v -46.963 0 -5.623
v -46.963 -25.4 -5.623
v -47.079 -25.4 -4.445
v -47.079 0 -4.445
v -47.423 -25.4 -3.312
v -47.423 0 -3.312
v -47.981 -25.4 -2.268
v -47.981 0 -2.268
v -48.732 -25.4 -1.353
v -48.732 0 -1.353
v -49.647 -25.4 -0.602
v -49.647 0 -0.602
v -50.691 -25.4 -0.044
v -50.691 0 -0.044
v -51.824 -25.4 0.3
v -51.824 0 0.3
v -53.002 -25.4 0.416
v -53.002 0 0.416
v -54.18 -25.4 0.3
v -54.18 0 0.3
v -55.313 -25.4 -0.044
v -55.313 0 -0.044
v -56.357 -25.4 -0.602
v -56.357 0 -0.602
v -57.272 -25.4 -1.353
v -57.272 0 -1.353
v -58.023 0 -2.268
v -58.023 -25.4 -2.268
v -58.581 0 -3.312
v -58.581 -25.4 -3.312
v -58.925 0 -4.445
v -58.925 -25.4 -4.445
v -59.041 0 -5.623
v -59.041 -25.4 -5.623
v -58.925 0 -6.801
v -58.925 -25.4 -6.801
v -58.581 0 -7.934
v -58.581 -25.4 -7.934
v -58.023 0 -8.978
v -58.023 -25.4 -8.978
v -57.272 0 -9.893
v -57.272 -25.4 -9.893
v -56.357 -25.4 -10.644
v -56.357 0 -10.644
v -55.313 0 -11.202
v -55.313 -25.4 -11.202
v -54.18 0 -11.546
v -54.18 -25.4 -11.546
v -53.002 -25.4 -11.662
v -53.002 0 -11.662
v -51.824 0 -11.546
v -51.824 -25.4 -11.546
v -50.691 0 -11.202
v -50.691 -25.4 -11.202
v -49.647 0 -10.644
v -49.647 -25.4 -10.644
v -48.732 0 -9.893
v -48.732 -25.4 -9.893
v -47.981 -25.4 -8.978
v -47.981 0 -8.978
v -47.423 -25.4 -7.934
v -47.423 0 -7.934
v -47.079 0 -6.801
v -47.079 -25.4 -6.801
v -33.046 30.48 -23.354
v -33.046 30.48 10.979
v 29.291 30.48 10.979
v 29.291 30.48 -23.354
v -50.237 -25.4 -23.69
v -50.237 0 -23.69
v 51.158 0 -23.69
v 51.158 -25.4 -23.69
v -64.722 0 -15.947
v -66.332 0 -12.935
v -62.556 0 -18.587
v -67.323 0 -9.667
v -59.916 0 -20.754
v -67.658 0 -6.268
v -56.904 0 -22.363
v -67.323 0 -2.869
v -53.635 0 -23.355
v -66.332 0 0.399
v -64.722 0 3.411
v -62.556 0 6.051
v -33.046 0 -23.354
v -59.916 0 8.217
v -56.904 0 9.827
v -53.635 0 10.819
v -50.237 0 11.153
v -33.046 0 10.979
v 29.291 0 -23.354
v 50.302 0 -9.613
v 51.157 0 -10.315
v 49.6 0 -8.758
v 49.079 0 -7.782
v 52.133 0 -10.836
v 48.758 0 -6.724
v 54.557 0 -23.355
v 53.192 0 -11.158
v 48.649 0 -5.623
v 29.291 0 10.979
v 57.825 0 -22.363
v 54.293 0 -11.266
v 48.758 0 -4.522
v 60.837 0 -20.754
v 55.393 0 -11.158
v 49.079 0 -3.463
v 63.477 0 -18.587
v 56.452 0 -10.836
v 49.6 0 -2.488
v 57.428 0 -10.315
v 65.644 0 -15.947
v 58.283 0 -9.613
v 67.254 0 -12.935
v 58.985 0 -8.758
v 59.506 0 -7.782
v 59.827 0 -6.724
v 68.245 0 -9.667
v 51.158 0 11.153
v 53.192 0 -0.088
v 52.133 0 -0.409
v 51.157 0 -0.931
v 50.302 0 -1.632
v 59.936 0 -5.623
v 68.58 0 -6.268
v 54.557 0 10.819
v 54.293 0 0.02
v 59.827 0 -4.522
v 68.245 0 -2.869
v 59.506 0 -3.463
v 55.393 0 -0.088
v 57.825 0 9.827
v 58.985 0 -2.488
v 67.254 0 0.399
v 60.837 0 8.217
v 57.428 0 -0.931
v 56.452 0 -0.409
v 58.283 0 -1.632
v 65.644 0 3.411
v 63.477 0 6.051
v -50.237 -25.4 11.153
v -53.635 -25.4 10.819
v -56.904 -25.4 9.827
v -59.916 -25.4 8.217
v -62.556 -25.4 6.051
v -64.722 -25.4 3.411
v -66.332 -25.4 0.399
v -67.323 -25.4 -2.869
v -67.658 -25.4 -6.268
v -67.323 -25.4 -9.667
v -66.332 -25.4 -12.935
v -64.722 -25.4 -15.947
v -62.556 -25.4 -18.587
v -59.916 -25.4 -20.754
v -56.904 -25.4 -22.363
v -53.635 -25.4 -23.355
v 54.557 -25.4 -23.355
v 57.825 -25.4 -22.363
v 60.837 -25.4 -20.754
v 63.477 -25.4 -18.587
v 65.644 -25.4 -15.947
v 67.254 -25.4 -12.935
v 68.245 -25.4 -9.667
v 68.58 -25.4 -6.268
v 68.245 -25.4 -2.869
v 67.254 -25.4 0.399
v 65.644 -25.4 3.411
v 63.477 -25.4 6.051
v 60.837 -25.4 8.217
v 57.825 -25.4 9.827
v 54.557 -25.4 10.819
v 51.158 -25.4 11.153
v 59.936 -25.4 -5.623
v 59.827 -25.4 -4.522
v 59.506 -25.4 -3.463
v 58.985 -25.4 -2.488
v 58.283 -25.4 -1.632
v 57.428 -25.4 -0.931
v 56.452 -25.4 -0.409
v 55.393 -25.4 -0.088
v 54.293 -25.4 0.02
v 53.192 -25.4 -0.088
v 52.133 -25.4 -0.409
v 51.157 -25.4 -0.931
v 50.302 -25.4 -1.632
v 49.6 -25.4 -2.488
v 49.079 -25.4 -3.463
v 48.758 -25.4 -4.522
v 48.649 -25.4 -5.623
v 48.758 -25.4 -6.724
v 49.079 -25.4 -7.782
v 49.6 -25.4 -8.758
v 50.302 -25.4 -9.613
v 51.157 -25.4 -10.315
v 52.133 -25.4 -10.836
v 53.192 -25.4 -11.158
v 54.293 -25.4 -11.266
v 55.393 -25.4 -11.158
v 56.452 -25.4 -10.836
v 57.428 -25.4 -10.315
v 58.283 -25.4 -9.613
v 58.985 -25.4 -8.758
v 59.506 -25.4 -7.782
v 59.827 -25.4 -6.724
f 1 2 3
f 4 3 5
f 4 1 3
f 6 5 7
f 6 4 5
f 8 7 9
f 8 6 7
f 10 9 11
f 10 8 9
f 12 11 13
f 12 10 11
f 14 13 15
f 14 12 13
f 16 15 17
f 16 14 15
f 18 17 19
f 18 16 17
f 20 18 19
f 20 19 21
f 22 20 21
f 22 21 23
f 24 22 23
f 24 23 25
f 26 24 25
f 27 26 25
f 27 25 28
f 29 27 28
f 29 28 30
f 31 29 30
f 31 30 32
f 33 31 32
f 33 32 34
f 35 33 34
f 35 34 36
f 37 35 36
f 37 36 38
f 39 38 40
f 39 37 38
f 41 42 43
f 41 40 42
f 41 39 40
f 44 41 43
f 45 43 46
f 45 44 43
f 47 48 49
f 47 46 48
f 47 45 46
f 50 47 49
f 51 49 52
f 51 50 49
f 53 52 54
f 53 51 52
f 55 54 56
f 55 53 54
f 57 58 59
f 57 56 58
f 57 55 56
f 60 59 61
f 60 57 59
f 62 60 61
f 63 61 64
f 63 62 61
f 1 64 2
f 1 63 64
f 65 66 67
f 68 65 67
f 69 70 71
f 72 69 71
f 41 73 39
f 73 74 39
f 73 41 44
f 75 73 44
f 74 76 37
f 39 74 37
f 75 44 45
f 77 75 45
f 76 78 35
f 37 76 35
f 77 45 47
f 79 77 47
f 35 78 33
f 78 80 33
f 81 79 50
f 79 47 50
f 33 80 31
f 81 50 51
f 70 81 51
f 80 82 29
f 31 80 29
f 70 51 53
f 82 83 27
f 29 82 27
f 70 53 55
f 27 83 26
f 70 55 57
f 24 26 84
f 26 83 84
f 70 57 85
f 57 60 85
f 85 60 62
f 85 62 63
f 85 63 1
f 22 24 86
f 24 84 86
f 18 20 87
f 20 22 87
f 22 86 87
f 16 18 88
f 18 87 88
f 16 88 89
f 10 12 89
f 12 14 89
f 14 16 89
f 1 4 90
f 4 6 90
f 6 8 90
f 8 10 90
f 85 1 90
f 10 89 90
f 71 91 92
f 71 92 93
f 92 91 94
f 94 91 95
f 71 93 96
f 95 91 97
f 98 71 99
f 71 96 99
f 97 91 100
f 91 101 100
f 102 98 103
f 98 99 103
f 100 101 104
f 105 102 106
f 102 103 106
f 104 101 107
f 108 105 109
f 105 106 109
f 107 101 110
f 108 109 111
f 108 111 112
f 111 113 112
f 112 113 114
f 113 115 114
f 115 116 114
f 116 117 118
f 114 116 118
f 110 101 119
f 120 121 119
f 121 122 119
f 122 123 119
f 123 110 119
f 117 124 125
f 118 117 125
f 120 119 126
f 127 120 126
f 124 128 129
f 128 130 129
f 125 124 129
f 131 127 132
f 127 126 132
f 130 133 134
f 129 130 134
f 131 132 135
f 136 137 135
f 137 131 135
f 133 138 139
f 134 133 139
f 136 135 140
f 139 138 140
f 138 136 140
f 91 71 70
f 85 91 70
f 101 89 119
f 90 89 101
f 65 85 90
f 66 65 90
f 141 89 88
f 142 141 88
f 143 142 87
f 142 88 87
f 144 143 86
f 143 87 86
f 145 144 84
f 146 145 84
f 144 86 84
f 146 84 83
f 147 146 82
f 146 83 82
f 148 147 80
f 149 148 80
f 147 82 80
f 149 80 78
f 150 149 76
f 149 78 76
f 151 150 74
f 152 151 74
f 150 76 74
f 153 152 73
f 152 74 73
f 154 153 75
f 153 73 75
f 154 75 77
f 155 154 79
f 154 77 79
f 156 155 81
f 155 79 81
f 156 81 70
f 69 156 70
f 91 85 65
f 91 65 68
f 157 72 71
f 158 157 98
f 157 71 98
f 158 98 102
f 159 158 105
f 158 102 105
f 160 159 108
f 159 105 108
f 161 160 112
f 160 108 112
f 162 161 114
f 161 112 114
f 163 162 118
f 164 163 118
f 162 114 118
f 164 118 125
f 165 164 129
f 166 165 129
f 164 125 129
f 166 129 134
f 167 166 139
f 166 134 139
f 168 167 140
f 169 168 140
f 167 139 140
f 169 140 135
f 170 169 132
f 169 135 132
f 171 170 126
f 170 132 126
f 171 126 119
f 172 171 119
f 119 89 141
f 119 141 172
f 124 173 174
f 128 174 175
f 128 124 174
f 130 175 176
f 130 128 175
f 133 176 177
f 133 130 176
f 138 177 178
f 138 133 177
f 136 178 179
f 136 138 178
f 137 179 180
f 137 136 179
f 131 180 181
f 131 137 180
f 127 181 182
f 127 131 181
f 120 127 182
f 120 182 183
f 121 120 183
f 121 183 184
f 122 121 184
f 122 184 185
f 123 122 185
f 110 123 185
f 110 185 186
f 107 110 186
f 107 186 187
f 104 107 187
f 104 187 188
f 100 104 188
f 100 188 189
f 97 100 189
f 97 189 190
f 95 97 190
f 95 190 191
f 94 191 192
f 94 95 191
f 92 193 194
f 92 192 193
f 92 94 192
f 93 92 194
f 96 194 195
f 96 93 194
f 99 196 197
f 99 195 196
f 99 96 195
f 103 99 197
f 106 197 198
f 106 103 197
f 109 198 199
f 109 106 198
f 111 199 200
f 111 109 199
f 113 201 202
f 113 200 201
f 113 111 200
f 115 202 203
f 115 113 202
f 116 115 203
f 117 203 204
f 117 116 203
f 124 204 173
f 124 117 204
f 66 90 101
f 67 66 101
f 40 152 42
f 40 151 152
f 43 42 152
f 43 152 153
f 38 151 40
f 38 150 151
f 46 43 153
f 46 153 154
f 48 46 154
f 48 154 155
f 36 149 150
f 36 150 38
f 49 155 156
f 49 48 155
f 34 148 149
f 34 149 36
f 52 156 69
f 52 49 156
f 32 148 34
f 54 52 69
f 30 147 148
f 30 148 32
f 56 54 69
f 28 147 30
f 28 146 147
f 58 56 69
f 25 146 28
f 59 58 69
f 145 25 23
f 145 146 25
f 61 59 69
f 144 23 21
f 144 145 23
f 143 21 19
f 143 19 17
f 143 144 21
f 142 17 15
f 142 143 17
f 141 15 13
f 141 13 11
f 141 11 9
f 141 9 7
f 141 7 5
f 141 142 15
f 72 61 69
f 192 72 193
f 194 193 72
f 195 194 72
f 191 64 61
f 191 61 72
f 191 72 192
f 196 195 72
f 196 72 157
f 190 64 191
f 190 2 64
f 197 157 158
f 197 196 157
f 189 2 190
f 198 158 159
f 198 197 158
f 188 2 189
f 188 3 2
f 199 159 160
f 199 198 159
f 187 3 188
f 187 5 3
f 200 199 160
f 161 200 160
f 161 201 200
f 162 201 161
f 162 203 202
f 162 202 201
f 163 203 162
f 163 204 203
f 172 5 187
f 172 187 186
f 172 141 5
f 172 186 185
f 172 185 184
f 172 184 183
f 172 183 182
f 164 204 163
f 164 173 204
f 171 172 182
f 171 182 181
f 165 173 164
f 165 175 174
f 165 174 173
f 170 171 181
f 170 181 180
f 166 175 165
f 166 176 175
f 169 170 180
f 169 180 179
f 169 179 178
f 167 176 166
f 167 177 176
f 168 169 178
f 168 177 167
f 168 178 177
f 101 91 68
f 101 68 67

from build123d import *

# Parameters (mm, degrees)
F0_W     = 101.395164
F0_H     = 34.843063
F1_DEPTH = 25.4
F2_R     = 6.038851
F2_R_2   = 5.643182
F3_DEPTH = 46.99
F4_W     = 62.337181
F4_H     = 34.332353
F5_DEPTH = 30.48


with BuildPart() as f1:
    # F0 (on Front) → F1 (new body)
    with BuildSketch(Plane.XZ):
        with BuildLine():
            Line((-50.236695, -23.689596), (-50.236695, 11.153467))
            ThreePointArc((-50.236695, 11.153467), (-67.658226, -6.268064), (-50.236695, -23.689596))
        make_face()
        with Locations((0.460887, -6.268064)):
            Rectangle(F0_W, F0_H)
        with BuildLine():
            ThreePointArc((51.158469, -23.689596), (68.580001, -6.268064), (51.158469, 11.153467))
            Line((51.158469, 11.153467), (51.158469, -23.689596))
        make_face()
    extrude(amount=F1_DEPTH)

    # F2 (on Front) → F3 (cut)
    with BuildSketch(Plane.XZ):
        with Locations((-53.002015, -5.622823)):
            Circle(F2_R)
        with Locations((54.292504, -5.622823)):
            Circle(F2_R_2)
    extrude(amount=F3_DEPTH, mode=Mode.SUBTRACT)

    # F4 (on Front) → F5 (join)
    with BuildSketch(Plane.XZ):
        with Locations((-1.877168, -6.187636)):
            Rectangle(F4_W, F4_H)
    extrude(amount=-F5_DEPTH)


solid = f1.part
